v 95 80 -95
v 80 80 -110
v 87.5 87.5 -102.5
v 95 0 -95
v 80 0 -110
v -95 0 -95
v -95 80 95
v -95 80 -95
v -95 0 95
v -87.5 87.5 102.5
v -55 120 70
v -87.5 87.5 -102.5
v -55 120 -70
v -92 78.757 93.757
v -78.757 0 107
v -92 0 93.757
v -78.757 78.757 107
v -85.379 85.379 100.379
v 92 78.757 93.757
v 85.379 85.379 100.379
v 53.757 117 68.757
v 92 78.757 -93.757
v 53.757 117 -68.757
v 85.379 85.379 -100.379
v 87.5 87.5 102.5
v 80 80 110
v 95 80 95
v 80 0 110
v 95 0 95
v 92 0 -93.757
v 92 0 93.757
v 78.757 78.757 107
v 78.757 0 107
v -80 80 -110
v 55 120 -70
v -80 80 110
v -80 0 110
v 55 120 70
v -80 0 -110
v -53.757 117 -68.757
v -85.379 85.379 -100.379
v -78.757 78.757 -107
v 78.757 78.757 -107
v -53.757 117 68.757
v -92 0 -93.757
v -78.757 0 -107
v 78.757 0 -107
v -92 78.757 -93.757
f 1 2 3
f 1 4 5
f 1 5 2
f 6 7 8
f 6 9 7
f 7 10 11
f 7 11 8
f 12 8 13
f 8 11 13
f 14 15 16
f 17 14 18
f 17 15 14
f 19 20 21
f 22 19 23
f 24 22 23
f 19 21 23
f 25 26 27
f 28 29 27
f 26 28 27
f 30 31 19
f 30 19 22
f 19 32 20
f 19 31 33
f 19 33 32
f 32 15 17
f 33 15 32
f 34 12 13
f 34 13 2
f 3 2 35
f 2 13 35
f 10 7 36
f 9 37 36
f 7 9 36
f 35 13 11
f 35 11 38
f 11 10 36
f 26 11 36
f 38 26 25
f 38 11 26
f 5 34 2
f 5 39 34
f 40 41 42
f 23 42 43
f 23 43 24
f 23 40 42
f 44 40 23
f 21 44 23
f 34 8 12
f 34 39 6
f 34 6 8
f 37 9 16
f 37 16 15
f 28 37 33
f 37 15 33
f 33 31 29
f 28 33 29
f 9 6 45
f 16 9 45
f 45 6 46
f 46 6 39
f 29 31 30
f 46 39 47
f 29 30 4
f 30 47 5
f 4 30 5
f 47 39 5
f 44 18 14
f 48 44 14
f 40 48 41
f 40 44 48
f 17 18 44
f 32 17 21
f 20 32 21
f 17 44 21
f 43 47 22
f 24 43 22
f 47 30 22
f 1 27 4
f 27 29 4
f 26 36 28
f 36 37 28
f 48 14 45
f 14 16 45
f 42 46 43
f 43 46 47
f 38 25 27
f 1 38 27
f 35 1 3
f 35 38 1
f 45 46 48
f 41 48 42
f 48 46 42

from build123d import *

# Parameters (mm, degrees)
SKETCH1_W           = 190
SKETCH1_H           = 220
BOSS_EXTRUDE1_DEPTH = 120
CHAMFER1_SIZE       = 40
CHAMFER2_SIZE       = 15
SHELL1_T            = -3


with BuildPart() as part:
    # Sketch1 → Boss-Extrude1 (new body)
    with BuildSketch(Plane(origin=(0, 0, 0), x_dir=(1, 0, 0), z_dir=(0, 1, 0))):
        Rectangle(SKETCH1_W, SKETCH1_H)
    extrude(amount=BOSS_EXTRUDE1_DEPTH)

    # Chamfer1
    chamfer1_edges = [part.edges().sort_by_distance(p)[0] for p in [
        (-95, 120, 0),
        (0, 120, 110),
        (95, 120, 0),
        (0, 120, -110),
    ]]
    chamfer(chamfer1_edges, length=CHAMFER1_SIZE)

    # Chamfer2
    chamfer2_edges = [part.edges().sort_by_distance(p)[0] for p in [
        (95, 40, 110),
        (-95, 40, 110),
        (-95, 40, -110),
        (95, 40, -110),
    ]]
    chamfer(chamfer2_edges, length=CHAMFER2_SIZE)

    # Shell1
    shell1_openings = [part.faces().sort_by_distance(p)[0] for p in [
        (0, 0, 0),
    ]]
    offset(amount=SHELL1_T, openings=shell1_openings, kind=Kind.INTERSECTION)


solid = part.part
